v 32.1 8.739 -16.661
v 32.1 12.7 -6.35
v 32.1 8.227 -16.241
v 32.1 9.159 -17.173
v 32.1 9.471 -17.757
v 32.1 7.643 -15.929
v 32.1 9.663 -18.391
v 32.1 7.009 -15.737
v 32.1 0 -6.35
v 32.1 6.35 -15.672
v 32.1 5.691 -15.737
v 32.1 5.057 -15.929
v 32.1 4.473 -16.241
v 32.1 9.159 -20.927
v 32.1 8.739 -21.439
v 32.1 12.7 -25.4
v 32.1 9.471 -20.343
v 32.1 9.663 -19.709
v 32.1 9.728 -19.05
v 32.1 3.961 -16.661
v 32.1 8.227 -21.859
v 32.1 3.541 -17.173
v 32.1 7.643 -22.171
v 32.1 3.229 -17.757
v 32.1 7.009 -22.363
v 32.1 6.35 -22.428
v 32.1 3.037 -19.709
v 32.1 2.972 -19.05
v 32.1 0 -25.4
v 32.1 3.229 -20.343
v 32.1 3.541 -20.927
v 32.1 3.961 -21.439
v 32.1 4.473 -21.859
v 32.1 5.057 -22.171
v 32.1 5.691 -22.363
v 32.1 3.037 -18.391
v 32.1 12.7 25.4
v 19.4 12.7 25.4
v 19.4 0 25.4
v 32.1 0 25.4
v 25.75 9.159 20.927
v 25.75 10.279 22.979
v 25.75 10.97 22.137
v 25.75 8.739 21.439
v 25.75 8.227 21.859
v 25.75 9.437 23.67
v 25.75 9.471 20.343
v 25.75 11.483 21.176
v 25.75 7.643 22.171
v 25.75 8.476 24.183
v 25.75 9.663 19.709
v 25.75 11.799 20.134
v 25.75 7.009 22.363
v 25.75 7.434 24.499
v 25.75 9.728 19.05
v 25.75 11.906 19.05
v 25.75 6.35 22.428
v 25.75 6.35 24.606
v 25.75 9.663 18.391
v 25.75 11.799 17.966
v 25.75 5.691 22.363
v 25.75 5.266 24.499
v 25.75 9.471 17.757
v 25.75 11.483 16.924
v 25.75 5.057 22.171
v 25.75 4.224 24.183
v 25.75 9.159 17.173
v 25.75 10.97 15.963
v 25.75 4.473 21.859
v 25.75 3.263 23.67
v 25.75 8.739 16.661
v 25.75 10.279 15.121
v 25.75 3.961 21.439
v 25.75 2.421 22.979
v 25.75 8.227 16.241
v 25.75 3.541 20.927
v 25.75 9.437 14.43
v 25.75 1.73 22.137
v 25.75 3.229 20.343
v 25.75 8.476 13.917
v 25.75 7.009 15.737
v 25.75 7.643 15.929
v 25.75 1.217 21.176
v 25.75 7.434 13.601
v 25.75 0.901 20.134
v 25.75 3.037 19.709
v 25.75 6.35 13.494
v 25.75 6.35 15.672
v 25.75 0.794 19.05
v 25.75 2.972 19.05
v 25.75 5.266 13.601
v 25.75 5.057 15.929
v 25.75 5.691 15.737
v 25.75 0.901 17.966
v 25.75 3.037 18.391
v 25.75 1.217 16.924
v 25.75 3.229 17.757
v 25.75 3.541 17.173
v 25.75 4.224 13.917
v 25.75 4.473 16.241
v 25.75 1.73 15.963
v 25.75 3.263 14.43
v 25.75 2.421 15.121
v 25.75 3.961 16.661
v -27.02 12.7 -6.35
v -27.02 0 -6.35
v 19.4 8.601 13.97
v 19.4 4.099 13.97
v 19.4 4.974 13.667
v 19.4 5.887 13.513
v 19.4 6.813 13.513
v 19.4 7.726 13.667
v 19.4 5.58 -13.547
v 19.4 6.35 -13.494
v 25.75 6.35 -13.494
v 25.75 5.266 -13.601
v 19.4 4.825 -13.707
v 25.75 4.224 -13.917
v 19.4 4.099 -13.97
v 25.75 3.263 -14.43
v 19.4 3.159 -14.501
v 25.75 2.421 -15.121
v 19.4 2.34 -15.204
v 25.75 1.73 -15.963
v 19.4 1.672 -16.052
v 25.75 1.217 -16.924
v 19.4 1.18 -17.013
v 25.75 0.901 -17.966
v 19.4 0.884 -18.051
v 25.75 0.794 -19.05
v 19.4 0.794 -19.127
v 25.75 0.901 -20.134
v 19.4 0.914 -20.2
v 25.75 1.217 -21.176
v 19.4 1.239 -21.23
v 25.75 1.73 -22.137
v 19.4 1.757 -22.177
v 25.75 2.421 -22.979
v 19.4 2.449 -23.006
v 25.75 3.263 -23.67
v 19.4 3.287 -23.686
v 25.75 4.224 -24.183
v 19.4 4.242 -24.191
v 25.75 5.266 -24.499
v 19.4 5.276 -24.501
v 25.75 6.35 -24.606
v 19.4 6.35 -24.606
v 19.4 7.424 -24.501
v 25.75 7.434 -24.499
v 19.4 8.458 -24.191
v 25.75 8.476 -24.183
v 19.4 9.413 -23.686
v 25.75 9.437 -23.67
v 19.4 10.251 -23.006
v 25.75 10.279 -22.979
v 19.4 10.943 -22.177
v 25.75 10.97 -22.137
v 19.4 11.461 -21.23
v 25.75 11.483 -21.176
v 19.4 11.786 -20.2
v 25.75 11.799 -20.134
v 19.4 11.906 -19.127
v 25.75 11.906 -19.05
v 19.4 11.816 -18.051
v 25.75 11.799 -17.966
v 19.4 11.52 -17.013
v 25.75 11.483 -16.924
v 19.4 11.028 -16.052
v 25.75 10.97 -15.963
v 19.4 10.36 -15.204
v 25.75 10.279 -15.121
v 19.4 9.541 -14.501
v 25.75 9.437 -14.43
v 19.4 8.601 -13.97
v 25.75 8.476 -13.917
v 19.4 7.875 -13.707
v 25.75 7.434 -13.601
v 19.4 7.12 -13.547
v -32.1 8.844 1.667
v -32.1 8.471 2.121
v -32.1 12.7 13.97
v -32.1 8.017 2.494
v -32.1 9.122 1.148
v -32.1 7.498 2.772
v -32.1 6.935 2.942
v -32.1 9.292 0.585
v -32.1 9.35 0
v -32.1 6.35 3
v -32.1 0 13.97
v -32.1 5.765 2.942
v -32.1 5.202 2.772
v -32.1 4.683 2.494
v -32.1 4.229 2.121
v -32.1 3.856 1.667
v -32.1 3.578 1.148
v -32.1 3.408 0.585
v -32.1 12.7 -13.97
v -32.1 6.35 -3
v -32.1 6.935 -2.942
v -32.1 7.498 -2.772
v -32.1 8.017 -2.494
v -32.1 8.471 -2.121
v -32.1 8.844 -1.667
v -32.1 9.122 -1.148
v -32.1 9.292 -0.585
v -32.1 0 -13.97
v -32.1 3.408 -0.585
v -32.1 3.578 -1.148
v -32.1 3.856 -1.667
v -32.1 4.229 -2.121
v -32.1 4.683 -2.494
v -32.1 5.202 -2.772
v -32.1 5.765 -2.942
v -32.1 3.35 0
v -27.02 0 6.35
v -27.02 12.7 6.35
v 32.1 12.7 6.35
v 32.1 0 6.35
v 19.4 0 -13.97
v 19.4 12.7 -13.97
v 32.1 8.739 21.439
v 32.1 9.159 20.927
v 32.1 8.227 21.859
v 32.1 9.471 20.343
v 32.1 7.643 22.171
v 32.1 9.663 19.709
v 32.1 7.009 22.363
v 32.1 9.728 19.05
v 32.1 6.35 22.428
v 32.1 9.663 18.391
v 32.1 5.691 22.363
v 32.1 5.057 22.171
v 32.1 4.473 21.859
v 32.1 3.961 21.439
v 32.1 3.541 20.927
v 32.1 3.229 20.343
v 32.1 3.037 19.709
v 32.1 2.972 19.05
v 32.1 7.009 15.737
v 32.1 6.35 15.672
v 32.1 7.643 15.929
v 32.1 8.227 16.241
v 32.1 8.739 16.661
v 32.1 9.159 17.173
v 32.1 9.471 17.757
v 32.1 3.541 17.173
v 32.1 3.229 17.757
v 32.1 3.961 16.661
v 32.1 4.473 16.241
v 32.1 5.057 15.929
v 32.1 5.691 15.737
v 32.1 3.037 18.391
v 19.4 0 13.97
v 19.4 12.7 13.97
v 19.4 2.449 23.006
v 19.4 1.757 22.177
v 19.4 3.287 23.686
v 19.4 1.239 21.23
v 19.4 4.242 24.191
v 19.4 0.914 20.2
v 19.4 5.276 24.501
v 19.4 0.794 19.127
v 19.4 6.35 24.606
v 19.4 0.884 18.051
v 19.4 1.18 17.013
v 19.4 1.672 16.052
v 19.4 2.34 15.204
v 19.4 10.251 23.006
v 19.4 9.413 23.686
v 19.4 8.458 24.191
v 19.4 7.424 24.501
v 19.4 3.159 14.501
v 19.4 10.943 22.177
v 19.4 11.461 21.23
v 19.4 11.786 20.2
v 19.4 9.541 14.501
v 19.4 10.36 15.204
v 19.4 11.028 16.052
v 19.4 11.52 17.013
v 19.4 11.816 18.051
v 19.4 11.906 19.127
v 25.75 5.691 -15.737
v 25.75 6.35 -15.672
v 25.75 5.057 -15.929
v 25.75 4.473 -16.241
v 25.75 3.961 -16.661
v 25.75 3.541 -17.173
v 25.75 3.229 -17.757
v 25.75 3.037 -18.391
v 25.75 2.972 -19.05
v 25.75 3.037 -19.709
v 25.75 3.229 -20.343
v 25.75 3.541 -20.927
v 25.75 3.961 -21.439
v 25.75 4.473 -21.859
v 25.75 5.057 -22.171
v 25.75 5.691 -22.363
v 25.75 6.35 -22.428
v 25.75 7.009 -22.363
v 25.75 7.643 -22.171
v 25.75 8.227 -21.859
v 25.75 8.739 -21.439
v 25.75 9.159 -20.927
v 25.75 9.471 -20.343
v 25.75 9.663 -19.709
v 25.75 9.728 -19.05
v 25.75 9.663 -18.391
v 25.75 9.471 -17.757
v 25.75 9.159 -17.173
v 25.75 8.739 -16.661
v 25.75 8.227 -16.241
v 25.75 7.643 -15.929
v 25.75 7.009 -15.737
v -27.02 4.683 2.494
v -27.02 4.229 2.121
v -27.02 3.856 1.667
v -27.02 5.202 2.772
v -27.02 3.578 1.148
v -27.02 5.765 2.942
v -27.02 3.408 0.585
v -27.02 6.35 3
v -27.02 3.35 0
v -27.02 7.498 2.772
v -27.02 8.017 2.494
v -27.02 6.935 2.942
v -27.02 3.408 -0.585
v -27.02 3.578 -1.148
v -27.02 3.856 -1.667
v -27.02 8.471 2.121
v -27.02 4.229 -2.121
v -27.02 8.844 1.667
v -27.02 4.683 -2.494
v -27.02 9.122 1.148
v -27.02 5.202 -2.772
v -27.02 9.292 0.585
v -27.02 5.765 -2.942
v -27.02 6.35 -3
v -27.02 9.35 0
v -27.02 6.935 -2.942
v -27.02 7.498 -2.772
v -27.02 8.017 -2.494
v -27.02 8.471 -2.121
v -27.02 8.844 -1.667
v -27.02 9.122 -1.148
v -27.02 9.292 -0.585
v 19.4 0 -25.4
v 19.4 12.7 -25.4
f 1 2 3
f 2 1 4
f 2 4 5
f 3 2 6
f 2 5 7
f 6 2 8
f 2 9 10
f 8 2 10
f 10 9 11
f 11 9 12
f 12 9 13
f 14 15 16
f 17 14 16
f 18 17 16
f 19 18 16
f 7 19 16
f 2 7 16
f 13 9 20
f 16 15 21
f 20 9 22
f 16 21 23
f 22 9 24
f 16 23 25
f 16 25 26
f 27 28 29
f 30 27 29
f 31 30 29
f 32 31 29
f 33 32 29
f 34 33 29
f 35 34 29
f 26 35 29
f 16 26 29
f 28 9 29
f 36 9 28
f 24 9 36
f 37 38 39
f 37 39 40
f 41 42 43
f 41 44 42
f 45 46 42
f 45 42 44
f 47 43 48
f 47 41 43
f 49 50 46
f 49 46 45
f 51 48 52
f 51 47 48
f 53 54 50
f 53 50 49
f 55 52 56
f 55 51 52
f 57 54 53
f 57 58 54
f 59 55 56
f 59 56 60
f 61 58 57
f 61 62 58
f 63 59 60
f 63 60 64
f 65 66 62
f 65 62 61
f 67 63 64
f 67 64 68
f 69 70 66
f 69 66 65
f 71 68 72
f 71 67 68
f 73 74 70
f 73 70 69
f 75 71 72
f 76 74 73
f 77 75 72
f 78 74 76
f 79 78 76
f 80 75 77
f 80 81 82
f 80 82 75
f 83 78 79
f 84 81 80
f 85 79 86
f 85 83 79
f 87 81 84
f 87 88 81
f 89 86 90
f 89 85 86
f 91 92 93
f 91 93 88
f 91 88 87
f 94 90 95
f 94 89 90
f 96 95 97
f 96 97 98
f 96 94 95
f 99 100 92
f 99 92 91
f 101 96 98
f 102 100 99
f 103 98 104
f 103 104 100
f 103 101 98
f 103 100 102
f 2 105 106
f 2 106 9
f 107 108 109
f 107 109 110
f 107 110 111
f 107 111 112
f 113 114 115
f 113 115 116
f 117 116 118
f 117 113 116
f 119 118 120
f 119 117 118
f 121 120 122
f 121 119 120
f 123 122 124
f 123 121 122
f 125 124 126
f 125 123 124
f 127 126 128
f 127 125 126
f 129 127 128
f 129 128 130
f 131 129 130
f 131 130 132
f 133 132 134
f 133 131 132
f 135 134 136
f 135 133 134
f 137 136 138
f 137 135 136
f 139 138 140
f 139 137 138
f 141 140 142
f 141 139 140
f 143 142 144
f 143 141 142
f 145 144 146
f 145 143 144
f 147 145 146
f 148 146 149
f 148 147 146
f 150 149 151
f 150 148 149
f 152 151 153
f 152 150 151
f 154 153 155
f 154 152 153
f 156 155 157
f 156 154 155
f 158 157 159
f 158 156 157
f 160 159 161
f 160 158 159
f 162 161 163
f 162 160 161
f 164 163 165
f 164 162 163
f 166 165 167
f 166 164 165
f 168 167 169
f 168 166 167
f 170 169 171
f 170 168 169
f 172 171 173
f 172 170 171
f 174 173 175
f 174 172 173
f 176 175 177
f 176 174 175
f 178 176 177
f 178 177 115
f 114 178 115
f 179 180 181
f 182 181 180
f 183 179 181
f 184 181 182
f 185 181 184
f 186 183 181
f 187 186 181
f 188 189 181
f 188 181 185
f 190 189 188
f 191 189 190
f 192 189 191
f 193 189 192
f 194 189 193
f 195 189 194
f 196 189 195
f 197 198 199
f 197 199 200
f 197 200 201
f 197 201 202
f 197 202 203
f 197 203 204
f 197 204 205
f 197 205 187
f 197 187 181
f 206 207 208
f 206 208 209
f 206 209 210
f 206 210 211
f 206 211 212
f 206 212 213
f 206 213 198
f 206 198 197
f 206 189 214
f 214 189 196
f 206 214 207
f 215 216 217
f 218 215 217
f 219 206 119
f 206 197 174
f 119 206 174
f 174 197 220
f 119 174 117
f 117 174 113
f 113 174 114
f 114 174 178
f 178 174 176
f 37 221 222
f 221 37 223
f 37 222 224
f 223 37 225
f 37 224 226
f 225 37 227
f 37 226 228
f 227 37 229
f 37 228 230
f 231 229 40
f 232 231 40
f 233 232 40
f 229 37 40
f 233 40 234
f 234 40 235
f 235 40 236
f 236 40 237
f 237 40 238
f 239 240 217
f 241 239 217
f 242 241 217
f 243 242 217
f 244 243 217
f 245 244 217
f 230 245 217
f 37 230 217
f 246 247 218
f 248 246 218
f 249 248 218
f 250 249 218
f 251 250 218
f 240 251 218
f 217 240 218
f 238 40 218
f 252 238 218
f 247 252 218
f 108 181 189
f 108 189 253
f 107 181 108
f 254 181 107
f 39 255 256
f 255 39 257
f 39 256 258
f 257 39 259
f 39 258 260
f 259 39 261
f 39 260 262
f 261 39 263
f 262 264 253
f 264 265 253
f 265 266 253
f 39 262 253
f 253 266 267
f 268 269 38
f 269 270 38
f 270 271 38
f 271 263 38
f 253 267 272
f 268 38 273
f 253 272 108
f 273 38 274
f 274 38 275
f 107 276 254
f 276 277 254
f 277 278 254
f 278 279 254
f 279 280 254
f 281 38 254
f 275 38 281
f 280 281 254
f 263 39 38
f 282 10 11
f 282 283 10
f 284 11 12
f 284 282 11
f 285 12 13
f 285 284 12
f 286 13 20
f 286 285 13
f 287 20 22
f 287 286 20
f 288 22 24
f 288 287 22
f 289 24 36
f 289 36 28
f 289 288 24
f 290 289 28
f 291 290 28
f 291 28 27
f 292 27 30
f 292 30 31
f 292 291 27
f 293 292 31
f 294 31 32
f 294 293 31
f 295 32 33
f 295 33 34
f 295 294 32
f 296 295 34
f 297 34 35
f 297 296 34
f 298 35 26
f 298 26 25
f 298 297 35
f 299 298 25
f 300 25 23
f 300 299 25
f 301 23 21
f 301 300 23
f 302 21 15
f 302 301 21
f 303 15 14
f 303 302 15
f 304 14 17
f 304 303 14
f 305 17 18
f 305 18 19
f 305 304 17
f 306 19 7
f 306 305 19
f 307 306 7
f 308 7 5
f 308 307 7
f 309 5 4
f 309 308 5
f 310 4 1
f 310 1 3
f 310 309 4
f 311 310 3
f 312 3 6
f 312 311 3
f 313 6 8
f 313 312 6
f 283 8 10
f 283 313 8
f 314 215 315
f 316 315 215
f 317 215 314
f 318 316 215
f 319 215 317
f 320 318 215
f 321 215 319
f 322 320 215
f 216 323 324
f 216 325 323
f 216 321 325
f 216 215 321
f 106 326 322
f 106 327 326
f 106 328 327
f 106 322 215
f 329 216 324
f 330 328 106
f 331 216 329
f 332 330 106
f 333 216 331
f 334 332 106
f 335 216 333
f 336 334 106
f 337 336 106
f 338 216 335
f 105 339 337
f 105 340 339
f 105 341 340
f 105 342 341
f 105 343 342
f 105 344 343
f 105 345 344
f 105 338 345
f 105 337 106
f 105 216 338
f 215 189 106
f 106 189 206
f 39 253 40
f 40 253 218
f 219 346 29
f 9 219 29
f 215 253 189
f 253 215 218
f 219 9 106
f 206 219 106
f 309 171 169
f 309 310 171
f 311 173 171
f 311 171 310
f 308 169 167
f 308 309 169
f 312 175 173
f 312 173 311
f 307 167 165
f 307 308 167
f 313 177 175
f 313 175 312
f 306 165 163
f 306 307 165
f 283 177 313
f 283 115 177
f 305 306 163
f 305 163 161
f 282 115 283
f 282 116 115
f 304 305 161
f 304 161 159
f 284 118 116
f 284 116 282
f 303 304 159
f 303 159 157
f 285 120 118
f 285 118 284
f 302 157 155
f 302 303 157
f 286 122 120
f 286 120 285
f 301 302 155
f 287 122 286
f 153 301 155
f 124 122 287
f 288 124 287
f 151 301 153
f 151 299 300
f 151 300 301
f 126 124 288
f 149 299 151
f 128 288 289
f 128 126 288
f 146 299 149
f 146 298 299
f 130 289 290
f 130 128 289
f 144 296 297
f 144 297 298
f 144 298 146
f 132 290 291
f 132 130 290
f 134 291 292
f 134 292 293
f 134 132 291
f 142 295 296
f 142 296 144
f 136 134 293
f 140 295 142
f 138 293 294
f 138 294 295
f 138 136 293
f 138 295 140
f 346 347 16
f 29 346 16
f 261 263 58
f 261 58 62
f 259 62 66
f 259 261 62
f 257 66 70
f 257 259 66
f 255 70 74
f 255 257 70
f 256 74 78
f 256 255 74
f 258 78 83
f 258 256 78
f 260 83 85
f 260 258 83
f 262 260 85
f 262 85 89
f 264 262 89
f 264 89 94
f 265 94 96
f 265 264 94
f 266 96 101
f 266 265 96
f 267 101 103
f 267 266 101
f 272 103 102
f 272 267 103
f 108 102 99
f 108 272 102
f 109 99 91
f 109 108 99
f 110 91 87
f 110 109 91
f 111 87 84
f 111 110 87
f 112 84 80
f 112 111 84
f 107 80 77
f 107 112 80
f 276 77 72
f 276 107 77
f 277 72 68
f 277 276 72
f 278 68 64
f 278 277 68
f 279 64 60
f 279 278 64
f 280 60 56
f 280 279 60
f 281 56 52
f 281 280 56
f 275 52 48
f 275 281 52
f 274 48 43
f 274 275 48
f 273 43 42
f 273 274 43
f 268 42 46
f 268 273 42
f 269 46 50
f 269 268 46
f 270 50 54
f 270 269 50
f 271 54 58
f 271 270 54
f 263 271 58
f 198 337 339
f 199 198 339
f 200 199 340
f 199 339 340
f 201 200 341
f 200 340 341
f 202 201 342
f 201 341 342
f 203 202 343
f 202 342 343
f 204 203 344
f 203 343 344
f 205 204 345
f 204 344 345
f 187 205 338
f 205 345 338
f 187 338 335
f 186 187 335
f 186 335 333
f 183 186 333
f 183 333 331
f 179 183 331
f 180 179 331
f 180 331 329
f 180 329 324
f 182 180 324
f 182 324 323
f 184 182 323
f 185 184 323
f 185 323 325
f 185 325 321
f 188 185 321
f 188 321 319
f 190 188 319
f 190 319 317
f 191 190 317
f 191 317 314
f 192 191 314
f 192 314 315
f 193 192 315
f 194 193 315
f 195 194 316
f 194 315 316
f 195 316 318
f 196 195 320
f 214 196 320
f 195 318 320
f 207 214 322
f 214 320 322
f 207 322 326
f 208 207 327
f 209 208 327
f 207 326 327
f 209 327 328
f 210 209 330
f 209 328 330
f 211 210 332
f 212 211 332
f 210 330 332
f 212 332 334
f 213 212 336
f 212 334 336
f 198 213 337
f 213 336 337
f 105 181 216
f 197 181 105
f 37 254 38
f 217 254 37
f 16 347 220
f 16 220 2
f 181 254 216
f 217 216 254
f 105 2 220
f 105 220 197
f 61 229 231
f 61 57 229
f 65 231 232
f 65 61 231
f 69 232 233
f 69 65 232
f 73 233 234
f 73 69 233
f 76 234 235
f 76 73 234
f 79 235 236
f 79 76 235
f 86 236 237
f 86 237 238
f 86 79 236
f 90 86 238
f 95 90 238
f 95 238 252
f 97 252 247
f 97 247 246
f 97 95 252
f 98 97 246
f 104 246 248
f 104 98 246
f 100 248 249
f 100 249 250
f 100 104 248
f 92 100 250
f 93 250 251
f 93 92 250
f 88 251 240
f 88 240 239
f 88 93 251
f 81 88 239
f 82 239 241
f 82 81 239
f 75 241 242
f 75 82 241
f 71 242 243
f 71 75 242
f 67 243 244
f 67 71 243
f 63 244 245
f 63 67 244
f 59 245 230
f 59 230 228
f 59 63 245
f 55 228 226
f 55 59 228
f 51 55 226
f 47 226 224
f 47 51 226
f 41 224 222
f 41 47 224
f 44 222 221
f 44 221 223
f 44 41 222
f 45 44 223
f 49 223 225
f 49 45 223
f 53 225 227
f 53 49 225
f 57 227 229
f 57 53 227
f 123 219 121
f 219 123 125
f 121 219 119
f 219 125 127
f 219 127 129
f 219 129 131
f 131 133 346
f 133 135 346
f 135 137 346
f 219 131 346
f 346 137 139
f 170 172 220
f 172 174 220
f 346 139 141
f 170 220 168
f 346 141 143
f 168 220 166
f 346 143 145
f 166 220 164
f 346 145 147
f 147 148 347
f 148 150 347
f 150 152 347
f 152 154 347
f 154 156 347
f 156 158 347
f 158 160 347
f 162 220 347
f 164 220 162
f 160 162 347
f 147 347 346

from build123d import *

# Parameters (mm, degrees)
SKETCH1_W                                     = 64.2
SKETCH1_H                                     = 50.8
BOSS_EXTRUDE1_DEPTH                           = 12.7
SKETCH4_W                                     = 51.5
SKETCH4_H                                     = 11.43
SKETCH4_W_2                                   = 59.12
SKETCH4_H_2                                   = 12.7
CUT_EXTRUDE1_DEPTH                            = 12.7
CBORE_FOR_1_4_SOCKET_HEAD_CAP_SCREW1_AT_COUNT = 2
CBORE_FOR_1_4_SOCKET_HEAD_CAP_SCREW1_AT_PITCH = 38.1
F_6_0MM_DOWEL_HOLE1_D                         = 6


with BuildPart() as part:
    # Sketch1 → Boss-Extrude1 (new body)
    with BuildSketch(Plane(origin=(0, 0, 0), x_dir=(1, 0, 0), z_dir=(0, 1, 0))):
        Rectangle(SKETCH1_W, SKETCH1_H)
    extrude(amount=BOSS_EXTRUDE1_DEPTH)

    # Sketch4 → Cut-Extrude1 (cut)
    with BuildSketch(Plane(origin=(0, 12.7, 0), x_dir=(1, 0, 0), z_dir=(0, 1, 0))):
        with Locations((-6.35, -19.685)):
            Rectangle(SKETCH4_W, SKETCH4_H)
        with Locations((-6.35, 19.685)):
            Rectangle(SKETCH4_W, SKETCH4_H)
        with Locations((2.54, 0)):
            Rectangle(SKETCH4_W_2, SKETCH4_H_2)
    extrude(amount=-CUT_EXTRUDE1_DEPTH, mode=Mode.SUBTRACT)

    # Sketch6 → CBORE for 1/4 Socket Head Cap Screw1 (revolve, cut)
    with BuildSketch(Plane(origin=(19.4, 6.35, 19.05), x_dir=(0, 0, 1), z_dir=(0, 1, 0))):
        Polygon((0, 0), (0, 12.7), (3.3782, 12.7), (3.3782, 6.35), (5.55625, 6.35), (5.55625, 0), align=None)
    cbore_for_1_4_socket_head_cap_screw1 = revolve(axis=Axis((13.05, 6.35, 19.05), (1, 0, 0)), mode=Mode.SUBTRACT)

    # CBORE for 1/4 Socket Head Cap Screw1 at: CBORE for 1/4 Socket Head Cap Screw1 ×2
    with Locations(*[(0, 0, -i * CBORE_FOR_1_4_SOCKET_HEAD_CAP_SCREW1_AT_PITCH) for i in range(1, CBORE_FOR_1_4_SOCKET_HEAD_CAP_SCREW1_AT_COUNT)]):
        add(cbore_for_1_4_socket_head_cap_screw1, mode=Mode.SUBTRACT)

    # Ø6.0mm Dowel Hole1 (through all)
    with Locations(Plane.ZY.offset(32.1)):
        with Locations((0, 6.35)):
            Hole(F_6_0MM_DOWEL_HOLE1_D / 2)


solid = part.part
